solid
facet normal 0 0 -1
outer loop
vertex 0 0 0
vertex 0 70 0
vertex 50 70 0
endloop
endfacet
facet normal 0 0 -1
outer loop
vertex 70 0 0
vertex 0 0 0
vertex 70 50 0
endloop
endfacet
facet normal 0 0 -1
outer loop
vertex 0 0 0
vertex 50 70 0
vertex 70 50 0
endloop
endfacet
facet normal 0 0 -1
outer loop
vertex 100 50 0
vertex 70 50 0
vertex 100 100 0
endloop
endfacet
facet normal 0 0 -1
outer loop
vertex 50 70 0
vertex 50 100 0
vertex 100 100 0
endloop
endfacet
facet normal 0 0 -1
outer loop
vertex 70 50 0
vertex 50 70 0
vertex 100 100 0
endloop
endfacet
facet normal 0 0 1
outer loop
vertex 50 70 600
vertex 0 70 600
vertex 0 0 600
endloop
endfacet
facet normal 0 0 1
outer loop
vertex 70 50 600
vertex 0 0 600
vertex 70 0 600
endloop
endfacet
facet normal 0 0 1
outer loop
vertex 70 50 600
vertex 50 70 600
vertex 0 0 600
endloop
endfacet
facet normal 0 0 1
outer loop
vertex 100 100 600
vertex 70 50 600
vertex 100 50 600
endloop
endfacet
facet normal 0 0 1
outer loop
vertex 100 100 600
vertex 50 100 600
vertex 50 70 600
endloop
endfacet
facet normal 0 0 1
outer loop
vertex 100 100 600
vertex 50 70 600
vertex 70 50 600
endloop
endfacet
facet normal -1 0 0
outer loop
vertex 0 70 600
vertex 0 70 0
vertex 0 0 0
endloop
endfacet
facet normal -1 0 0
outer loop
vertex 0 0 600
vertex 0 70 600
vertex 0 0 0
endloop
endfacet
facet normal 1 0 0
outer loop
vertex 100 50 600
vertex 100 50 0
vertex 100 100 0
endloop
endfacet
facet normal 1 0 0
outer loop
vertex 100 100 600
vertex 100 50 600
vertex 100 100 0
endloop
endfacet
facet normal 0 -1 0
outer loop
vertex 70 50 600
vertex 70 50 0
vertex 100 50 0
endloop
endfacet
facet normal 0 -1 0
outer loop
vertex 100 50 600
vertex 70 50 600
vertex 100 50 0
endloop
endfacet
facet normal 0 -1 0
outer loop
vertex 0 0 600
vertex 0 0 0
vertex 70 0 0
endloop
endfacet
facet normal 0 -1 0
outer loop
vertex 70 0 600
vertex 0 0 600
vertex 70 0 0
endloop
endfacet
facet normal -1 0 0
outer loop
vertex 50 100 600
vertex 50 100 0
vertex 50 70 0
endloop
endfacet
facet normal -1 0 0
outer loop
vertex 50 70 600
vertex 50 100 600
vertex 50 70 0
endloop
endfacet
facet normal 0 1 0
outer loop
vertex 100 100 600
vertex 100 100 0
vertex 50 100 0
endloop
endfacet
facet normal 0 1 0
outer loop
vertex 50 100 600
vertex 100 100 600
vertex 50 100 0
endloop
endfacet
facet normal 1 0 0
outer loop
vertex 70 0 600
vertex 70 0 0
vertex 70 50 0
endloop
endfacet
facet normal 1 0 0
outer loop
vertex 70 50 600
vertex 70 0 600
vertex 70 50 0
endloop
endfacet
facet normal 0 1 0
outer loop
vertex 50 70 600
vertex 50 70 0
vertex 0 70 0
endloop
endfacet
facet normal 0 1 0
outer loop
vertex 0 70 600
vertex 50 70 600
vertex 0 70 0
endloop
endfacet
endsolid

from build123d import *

# Parameters (mm, degrees)
F1_DEPTH = 600


with BuildPart() as f1:
    # F0 (on Top) → F1 (new body)
    with BuildSketch(Plane.XY):
        Polygon((0, 70), (0, 0), (70, 0), (70, 50), (100, 50), (100, 100), (50, 100), (50, 70), align=None)
    extrude(amount=F1_DEPTH)


with BuildPart() as f2_1:
    # F2: copy of F1
    add(f1.part)


solid = f1.part
